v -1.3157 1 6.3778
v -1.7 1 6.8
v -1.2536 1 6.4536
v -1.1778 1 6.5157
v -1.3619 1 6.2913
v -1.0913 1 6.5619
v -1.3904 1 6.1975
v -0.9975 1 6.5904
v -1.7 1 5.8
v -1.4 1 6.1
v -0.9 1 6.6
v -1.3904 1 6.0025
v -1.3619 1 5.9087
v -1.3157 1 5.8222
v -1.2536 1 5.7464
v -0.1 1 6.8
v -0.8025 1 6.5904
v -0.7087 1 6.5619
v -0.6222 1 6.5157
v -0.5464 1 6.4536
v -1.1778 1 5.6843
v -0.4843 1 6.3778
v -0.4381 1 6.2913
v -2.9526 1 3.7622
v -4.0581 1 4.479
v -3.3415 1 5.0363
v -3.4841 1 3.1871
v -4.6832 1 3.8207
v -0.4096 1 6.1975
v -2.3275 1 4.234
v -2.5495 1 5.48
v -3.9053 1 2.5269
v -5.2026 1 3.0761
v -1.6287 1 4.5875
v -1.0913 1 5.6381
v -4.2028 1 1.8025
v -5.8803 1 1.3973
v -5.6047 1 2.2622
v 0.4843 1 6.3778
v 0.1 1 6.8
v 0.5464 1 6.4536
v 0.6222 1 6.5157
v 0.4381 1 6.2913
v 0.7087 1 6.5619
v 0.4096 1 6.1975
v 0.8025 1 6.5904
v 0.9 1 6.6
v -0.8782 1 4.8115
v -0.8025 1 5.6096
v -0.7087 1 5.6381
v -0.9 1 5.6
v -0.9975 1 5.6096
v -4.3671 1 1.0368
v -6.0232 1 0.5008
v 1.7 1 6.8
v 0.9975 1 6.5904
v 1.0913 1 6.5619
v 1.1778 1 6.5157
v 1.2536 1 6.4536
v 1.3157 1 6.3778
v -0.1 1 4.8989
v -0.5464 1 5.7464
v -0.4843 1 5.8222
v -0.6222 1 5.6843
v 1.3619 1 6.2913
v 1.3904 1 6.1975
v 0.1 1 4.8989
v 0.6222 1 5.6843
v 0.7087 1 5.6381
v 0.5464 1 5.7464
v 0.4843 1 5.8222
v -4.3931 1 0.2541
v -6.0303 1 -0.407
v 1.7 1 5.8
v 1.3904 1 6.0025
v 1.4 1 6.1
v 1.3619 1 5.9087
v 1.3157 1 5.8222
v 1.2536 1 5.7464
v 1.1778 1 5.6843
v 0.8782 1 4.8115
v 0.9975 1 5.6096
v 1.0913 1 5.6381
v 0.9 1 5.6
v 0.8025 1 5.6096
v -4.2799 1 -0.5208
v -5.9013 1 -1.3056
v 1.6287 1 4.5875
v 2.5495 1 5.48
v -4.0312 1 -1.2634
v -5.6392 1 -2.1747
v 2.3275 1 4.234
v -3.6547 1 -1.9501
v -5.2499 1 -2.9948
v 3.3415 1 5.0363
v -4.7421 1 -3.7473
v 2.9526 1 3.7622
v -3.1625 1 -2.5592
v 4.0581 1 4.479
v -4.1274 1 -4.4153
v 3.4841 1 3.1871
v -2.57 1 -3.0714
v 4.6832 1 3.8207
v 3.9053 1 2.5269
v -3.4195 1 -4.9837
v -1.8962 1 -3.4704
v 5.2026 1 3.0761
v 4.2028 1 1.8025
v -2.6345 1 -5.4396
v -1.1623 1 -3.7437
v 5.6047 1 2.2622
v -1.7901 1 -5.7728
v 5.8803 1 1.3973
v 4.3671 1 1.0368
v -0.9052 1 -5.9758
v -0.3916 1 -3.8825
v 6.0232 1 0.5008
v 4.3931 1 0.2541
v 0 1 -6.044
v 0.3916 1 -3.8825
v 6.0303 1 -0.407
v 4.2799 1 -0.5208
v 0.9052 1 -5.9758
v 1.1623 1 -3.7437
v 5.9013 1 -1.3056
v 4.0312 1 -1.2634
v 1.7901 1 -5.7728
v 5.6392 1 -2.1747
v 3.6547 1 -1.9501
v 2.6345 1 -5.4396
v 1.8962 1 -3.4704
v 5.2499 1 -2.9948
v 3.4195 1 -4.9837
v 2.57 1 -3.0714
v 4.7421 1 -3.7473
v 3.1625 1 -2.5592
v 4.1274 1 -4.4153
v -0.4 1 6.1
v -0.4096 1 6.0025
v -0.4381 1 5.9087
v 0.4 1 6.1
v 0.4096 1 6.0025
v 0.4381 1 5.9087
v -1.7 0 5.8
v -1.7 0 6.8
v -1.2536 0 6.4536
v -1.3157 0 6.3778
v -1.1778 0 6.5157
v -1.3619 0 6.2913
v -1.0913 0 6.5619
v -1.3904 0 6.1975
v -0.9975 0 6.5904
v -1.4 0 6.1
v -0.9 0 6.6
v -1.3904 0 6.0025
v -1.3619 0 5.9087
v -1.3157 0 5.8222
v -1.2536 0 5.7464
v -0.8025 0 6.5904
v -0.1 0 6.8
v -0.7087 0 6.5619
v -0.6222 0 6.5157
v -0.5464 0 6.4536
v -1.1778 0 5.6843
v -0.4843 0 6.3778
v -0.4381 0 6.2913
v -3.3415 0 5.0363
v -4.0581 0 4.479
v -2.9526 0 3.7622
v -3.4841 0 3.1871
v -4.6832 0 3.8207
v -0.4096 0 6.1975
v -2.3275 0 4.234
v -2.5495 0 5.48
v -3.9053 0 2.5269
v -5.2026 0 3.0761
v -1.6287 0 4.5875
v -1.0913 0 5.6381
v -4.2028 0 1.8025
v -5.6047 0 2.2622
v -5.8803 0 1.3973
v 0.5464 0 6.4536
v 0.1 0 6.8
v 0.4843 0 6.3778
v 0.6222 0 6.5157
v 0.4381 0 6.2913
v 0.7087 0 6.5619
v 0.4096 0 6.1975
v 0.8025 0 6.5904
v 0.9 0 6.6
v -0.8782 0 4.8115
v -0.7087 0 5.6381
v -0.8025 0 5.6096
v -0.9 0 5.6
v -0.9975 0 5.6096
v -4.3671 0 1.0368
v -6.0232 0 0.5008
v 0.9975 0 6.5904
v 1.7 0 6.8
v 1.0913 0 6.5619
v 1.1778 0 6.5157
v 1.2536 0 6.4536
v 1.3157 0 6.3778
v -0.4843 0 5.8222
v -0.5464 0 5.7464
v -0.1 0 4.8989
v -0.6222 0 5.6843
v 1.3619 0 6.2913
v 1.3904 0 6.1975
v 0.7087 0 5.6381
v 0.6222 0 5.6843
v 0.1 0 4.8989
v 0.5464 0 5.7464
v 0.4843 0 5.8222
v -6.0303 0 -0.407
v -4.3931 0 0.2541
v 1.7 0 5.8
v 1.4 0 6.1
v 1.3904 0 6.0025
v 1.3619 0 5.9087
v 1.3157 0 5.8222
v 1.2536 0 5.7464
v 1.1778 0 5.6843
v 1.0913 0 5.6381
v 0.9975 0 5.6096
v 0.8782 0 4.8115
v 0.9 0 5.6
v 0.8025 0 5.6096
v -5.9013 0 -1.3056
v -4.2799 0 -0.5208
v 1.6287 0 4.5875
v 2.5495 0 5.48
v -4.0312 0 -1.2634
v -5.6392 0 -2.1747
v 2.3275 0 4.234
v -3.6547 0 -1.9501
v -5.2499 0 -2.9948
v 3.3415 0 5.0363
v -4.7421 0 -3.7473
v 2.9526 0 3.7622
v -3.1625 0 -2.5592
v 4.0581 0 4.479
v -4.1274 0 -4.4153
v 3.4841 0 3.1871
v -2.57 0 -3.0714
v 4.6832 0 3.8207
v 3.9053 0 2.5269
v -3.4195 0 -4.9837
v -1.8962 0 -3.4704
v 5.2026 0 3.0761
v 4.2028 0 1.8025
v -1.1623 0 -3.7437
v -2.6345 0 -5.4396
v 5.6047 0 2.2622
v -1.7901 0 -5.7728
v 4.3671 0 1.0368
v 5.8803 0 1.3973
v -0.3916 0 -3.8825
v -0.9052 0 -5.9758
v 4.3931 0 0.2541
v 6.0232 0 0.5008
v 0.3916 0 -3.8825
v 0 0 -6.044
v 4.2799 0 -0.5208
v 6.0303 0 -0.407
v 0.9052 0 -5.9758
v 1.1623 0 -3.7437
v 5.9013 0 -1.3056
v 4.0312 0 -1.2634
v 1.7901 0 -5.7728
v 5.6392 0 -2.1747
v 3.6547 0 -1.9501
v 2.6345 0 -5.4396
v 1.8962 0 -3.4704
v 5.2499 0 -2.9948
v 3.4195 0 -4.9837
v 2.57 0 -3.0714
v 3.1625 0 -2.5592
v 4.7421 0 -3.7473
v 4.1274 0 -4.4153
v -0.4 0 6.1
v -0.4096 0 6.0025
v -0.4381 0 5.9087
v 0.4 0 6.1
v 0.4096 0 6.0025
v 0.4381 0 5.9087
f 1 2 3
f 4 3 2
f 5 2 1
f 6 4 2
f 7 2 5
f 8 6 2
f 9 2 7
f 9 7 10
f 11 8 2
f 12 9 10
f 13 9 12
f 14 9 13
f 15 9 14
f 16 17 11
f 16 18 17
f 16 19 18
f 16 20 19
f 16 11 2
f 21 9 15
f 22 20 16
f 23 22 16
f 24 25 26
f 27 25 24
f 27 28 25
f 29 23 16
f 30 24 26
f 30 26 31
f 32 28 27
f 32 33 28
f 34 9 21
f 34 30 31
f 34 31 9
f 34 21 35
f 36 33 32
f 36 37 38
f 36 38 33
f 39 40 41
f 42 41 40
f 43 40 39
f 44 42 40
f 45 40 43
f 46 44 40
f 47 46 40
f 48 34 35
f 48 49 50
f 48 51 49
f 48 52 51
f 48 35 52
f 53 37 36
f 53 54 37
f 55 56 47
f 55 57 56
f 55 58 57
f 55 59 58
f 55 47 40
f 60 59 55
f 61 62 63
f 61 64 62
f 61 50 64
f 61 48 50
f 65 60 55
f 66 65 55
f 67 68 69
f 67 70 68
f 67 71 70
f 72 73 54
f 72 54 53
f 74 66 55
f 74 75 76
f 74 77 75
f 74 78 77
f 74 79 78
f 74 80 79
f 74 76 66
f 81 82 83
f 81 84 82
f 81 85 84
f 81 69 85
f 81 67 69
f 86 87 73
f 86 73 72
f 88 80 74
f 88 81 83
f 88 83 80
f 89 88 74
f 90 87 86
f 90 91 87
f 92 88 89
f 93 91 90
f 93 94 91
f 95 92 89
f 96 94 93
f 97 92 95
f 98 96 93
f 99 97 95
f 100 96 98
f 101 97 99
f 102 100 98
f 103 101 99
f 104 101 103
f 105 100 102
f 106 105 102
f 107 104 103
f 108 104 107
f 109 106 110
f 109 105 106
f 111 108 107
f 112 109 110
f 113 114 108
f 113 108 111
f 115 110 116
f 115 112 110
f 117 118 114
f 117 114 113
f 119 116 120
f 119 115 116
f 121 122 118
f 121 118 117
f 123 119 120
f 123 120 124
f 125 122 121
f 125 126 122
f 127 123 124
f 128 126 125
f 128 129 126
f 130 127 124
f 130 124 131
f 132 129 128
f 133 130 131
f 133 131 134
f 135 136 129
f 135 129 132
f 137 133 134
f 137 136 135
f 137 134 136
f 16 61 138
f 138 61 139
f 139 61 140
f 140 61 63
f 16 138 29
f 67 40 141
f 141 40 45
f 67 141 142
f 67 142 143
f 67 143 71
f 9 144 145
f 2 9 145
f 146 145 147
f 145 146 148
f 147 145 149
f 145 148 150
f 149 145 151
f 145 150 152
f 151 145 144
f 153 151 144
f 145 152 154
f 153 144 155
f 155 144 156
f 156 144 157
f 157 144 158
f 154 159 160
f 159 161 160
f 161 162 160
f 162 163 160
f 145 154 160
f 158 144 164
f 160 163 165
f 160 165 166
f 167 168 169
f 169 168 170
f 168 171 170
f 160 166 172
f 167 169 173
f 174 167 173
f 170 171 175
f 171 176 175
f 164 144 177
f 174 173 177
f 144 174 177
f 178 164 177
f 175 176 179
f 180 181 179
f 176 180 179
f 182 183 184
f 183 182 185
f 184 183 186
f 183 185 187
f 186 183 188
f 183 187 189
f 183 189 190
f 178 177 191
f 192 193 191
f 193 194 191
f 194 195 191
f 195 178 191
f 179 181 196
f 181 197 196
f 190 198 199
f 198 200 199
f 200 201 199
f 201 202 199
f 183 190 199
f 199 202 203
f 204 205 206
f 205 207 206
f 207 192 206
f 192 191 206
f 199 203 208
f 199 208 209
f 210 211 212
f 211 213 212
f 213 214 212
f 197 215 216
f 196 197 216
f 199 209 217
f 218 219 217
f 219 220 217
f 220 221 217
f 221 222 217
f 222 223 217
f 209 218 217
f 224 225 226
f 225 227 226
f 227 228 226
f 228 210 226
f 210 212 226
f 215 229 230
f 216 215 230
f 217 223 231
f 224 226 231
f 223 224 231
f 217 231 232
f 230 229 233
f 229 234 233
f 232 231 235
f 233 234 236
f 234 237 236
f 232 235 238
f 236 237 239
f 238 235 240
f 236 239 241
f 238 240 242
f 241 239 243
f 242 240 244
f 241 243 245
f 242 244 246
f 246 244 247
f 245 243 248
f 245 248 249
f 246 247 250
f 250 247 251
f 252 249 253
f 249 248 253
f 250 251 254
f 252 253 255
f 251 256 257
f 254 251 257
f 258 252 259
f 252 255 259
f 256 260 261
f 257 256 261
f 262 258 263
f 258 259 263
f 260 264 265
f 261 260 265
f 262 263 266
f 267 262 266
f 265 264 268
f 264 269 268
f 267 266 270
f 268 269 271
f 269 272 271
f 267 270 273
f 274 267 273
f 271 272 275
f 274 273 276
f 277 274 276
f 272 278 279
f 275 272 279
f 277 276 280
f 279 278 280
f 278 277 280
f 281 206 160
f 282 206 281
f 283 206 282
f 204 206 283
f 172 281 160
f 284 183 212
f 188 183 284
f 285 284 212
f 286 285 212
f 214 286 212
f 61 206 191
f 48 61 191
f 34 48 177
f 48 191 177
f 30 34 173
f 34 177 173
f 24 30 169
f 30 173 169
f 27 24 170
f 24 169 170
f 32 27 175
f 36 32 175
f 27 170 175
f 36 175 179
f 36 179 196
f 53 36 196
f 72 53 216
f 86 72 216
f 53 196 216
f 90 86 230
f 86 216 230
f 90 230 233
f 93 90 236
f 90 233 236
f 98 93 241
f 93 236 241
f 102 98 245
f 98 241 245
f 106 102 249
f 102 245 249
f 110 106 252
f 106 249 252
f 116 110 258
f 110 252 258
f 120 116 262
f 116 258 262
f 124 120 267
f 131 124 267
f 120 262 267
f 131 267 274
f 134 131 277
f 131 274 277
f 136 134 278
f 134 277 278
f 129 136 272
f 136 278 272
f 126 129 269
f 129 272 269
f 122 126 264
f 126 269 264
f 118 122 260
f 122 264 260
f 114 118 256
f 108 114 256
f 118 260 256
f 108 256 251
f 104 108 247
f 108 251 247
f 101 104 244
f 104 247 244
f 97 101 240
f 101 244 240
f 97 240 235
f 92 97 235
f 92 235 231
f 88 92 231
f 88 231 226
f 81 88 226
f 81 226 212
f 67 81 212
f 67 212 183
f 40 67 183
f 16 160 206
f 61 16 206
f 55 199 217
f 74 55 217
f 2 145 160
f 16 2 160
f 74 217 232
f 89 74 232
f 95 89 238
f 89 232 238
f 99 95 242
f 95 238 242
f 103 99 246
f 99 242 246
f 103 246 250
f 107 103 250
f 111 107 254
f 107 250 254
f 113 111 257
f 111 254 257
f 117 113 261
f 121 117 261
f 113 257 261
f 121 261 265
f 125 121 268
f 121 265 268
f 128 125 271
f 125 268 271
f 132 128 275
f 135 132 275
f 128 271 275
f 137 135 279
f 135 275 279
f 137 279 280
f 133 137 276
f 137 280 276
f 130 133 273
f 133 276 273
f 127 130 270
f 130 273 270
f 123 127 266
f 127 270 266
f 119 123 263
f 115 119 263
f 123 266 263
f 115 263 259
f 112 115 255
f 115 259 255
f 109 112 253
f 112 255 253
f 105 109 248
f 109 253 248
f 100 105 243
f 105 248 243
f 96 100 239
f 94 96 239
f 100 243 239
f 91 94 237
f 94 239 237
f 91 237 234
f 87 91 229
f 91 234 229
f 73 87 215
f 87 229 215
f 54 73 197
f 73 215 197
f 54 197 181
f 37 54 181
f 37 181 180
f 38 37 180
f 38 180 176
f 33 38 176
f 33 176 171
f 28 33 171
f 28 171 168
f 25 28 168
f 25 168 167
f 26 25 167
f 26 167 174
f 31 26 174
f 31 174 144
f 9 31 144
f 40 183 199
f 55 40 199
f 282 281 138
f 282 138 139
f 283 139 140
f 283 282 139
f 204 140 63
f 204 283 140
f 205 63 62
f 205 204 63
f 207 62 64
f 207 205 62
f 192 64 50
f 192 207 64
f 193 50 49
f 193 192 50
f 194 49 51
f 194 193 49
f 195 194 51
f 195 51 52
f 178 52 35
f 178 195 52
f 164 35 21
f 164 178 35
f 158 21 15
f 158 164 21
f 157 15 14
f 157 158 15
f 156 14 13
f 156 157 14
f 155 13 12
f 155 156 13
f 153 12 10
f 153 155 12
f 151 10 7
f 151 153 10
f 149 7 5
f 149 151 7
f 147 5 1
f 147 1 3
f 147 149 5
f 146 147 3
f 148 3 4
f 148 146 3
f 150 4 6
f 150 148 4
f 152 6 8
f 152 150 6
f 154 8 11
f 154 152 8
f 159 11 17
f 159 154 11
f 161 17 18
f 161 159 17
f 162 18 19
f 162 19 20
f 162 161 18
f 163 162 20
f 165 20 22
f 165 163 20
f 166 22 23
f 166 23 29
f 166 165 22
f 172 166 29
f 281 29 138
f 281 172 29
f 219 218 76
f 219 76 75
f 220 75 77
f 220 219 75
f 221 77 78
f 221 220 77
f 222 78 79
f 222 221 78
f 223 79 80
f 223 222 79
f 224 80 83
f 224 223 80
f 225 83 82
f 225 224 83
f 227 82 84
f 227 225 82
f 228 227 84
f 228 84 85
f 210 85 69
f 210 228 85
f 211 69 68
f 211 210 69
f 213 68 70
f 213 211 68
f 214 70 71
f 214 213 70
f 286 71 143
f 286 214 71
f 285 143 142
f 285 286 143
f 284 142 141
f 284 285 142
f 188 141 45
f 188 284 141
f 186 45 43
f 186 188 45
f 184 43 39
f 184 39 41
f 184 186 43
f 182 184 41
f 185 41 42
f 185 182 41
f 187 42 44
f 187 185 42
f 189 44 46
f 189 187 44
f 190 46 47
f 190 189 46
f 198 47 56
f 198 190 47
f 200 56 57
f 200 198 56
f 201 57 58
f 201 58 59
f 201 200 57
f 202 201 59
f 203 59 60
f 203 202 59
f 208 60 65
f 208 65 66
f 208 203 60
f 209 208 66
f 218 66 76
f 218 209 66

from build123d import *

# Parameters (mm, degrees)
SKETCH1_R           = 0.5
BOSS_EXTRUDE1_DEPTH = 1


with BuildPart() as part:
    # Sketch1 → Boss-Extrude1 (new body)
    with BuildSketch(Plane(origin=(0, 0, 0), x_dir=(1, 0, 0), z_dir=(0, 1, 0))):
        with BuildLine():
            Line((-1.7, -6.8), (-0.1, -6.8))
            Line((-0.1, -6.8), (-0.1, -4.89886349))
            ThreePointArc((-0.1, -4.89886349), (0, 3.9), (0.1, -4.89886349))
            Line((0.1, -4.89886349), (0.1, -6.8))
            Line((0.1, -6.8), (1.7, -6.8))
            Line((1.7, -6.8), (1.7, -5.8))
            ThreePointArc((1.7, -5.8), (0, 6.044005295), (-1.7, -5.8))
            Line((-1.7, -5.8), (-1.7, -6.8))
        make_face()
        with Locations((-0.9, -6.1)):
            Circle(SKETCH1_R, mode=Mode.SUBTRACT)
        with Locations((0.9, -6.1)):
            Circle(SKETCH1_R, mode=Mode.SUBTRACT)
    extrude(amount=BOSS_EXTRUDE1_DEPTH)


solid = part.part
